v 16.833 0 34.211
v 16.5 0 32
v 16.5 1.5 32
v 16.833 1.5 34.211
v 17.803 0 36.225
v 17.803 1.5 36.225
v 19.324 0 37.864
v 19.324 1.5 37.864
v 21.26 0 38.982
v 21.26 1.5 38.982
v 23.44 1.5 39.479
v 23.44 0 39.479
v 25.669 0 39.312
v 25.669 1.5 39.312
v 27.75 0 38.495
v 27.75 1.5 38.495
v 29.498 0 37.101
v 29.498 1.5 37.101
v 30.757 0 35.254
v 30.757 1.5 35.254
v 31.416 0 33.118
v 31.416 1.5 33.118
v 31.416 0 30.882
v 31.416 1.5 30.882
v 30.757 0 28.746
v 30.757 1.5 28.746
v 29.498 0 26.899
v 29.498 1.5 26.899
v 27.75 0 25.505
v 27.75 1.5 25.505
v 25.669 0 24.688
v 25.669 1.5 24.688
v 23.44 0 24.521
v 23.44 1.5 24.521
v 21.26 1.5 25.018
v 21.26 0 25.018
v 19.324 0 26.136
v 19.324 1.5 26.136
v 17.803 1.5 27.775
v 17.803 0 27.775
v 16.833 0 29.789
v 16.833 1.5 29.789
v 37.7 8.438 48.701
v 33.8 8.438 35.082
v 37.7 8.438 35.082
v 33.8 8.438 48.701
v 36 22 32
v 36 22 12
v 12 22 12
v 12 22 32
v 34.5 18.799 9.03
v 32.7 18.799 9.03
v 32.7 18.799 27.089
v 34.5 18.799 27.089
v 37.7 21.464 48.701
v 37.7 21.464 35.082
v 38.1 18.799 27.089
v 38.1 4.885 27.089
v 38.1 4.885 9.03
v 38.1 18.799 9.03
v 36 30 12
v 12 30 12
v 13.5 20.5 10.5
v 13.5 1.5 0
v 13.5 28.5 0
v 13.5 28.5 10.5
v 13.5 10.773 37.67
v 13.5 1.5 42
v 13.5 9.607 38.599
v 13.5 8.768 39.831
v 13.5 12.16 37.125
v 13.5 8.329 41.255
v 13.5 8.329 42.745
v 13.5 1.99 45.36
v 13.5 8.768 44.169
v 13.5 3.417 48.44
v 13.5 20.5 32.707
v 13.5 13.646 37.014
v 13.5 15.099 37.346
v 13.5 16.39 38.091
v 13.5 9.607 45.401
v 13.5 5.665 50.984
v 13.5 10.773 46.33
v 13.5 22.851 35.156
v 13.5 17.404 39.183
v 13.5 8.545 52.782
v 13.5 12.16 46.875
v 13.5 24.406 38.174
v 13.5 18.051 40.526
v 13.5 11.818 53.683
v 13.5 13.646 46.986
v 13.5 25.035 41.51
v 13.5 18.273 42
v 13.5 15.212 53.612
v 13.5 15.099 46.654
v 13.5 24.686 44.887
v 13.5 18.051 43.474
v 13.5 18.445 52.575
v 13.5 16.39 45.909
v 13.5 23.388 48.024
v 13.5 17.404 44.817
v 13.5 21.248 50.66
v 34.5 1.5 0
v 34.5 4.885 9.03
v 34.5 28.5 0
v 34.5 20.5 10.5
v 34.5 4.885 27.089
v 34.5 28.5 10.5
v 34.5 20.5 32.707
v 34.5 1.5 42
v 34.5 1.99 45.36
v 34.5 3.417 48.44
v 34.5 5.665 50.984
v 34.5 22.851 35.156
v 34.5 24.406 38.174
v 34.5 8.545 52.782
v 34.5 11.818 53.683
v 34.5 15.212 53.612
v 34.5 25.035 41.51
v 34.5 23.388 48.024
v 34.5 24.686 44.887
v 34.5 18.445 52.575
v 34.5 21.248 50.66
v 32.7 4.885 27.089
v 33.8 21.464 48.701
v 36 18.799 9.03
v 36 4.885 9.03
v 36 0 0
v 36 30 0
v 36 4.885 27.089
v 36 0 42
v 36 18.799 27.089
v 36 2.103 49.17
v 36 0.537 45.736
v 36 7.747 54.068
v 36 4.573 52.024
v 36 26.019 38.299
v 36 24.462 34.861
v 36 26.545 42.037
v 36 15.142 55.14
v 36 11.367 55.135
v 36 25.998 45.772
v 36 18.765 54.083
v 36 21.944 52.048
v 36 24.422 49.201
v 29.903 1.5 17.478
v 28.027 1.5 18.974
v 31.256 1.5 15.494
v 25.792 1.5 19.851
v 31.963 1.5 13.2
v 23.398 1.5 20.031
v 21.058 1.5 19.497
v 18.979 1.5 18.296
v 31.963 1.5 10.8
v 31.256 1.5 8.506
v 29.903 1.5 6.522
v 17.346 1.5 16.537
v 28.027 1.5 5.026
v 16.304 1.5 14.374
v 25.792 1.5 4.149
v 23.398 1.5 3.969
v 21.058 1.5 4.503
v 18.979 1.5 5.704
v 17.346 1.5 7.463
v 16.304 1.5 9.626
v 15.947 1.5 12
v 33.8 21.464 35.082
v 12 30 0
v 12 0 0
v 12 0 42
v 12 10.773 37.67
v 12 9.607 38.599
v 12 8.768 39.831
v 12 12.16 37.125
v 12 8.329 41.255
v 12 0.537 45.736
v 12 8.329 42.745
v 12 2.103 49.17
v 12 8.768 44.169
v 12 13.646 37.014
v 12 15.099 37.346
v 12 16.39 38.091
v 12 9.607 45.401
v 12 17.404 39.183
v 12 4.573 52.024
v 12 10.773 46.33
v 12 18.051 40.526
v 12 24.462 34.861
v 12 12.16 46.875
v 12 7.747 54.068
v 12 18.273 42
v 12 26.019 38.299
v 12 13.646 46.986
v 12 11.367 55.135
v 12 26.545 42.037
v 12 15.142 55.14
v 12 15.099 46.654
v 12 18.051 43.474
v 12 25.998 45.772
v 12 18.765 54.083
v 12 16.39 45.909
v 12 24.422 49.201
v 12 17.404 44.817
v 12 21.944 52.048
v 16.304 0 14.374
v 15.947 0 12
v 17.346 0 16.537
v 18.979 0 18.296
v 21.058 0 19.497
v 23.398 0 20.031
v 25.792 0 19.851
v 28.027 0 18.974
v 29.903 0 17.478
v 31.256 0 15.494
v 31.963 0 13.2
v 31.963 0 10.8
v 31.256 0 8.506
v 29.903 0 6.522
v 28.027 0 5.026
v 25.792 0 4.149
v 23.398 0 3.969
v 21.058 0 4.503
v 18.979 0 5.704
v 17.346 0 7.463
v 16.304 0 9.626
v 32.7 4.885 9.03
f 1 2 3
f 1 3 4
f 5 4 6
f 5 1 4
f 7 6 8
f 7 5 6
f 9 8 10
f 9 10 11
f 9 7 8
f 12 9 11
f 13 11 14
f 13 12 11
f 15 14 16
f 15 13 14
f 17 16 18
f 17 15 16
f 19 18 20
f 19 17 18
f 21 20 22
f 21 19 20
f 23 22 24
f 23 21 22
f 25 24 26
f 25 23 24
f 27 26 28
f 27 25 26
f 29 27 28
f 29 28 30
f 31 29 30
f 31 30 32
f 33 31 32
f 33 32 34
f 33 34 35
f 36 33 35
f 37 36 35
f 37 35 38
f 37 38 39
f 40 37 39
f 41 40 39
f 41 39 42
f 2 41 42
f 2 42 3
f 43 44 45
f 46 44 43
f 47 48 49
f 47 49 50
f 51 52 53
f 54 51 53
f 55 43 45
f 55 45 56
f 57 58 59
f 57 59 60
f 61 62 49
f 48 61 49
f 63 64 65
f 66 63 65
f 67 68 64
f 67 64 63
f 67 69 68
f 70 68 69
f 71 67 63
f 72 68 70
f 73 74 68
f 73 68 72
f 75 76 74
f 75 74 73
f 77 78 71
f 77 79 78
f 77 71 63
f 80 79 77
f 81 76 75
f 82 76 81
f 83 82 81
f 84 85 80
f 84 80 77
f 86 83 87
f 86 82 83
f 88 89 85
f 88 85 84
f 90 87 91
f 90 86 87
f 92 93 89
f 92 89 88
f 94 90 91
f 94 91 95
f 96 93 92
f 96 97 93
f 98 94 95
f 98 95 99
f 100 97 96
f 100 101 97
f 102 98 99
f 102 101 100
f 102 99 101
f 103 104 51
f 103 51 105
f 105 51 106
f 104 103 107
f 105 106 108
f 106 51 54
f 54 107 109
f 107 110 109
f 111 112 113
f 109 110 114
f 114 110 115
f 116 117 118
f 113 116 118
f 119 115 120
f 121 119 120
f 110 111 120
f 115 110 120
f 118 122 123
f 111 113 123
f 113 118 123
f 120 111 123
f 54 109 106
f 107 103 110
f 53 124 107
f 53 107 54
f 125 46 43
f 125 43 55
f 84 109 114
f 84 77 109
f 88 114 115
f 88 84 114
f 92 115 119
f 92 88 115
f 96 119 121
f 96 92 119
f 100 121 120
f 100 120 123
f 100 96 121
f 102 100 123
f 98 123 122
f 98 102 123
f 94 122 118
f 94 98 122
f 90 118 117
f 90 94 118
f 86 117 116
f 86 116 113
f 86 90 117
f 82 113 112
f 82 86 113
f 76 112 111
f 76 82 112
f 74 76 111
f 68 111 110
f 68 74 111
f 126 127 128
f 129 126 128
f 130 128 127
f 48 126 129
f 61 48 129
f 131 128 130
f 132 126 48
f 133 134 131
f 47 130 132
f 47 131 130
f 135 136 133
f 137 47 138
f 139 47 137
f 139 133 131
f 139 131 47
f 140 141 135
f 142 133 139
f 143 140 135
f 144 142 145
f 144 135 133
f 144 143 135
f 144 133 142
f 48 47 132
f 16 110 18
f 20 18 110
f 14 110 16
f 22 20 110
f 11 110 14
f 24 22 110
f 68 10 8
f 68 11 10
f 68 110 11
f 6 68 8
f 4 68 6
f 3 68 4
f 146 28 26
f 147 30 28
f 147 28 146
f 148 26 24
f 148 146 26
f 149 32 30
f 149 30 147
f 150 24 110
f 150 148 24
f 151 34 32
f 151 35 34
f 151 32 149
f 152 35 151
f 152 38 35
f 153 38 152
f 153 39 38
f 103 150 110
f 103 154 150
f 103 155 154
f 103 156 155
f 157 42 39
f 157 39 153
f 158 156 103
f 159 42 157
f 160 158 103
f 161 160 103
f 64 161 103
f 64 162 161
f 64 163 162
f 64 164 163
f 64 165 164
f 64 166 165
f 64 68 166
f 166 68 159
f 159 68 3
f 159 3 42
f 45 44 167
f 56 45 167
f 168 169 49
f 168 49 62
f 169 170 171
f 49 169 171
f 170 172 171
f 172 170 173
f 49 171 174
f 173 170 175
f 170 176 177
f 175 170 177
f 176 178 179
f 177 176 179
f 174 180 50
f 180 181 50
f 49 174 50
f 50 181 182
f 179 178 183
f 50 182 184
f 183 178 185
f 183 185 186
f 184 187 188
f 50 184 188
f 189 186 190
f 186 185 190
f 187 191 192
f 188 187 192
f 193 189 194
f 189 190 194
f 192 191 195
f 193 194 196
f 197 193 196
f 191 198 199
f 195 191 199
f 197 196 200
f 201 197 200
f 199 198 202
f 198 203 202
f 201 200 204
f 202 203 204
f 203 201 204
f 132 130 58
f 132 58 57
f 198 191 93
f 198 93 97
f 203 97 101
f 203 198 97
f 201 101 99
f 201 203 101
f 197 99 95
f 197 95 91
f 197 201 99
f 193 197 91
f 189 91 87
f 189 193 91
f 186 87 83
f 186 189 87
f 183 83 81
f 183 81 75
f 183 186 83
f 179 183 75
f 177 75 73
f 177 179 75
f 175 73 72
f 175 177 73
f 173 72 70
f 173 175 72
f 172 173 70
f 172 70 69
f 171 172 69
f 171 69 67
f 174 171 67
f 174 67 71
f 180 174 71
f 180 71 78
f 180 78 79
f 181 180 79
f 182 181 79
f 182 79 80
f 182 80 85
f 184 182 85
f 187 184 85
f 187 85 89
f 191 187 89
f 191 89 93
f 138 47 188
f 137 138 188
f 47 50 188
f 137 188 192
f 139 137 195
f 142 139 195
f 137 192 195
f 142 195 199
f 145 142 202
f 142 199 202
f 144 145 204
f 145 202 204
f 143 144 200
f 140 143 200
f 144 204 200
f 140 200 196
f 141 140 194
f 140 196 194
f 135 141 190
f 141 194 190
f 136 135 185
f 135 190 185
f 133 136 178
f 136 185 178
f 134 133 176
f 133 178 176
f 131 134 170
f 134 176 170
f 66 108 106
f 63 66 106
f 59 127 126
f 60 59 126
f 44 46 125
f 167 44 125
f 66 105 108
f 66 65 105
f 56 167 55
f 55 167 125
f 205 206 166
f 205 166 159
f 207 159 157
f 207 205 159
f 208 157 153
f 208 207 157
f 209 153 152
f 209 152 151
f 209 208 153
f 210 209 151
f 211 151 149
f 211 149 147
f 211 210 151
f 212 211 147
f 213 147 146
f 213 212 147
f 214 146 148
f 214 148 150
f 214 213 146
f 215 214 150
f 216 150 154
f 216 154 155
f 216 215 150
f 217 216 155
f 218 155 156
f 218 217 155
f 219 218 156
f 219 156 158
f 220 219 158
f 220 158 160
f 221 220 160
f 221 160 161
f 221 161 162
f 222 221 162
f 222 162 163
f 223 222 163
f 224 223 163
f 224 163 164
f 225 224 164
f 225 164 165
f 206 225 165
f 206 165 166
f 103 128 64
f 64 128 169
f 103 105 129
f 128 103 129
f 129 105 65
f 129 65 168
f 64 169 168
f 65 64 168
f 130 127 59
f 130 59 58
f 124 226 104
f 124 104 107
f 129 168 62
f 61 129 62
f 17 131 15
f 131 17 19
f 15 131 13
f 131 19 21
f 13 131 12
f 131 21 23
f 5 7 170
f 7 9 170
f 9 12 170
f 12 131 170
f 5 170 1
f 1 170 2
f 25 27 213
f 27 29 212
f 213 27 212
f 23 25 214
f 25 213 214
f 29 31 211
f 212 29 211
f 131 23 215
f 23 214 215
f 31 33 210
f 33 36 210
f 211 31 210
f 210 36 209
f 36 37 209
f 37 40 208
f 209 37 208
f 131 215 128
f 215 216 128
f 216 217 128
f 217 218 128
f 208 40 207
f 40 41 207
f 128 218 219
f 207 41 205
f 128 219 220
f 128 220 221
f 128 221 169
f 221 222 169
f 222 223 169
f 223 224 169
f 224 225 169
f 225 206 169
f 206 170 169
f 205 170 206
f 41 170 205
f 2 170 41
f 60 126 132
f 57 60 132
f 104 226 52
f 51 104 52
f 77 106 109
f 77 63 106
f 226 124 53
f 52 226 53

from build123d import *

# Parameters (mm, degrees)
F1_DEPTH  = 12
F2_T      = -1.5
F3_R      = 5
F4_DEPTH  = 5
F5_R      = 7.5
F5_R_2    = 8.0533004945
F6_DEPTH  = 5
F10_START = 33.8
F9_W      = 13.0263166502
F9_H      = 13.6184208095
F10_DEPTH = 3.9
F12_START = 32.7
F11_W     = 13.9144747518
F11_H     = 18.0592117831
F12_DEPTH = 5.4


with BuildPart() as f1:
    # F0 (on Right) → F1 (new body, symmetric)
    with BuildSketch(Plane.YZ):
        with BuildLine():
            Line((0, 42), (0, 0))
            Line((0, 0), (30, 0))
            Line((30, 0), (30, 12))
            Line((30, 12), (22, 12))
            Line((22, 12), (22, 32))
            ThreePointArc((22, 32), (18.7650208971, 54.0830459736), (0, 42))
        make_face()
    extrude(amount=F1_DEPTH, both=True)

    # F2
    f2_openings = [f1.faces().sort_by_distance(p)[0] for p in [
        (0, 15, 0),
    ]]
    offset(amount=F2_T, openings=f2_openings, kind=Kind.INTERSECTION)

    # F3 (on face) → F4 (cut)
    with BuildSketch(Plane.YZ.offset(12)):
        with Locations((13.2727272727, 42)):
            Circle(F3_R)
    extrude(amount=-F4_DEPTH, mode=Mode.SUBTRACT)

    # F5 (on face) → F6 (cut)
    with BuildSketch(Plane.XZ):
        with Locations((0, 32)):
            Circle(F5_R)
        with Locations((0, 12)):
            Circle(F5_R_2)
    extrude(amount=-F6_DEPTH, mode=Mode.SUBTRACT)


with BuildPart() as f7_1:
    # F7: instance of F1
    add(f1.part.mirror(Plane(origin=(12, 12.8367440459, 24.8577602778), x_dir=(0, 1, 0), z_dir=(1, 0, 0))))

    # F11 (on Right) → F12 (join)
    with BuildSketch(Plane.YZ.offset(F12_START)):
        with Locations((11.8421067018, 18.0592113174)):
            Rectangle(F11_W, F11_H)
    extrude(amount=F12_DEPTH)


with BuildPart() as f10:
    # F9 (on Right) → F10 (new body)
    with BuildSketch(Plane.YZ.offset(F10_START)):
        with Locations((14.9506586604, 41.8914500624)):
            Rectangle(F9_W, F9_H)
    extrude(amount=F10_DEPTH)


solid = Compound([f7_1.part, f10.part])
